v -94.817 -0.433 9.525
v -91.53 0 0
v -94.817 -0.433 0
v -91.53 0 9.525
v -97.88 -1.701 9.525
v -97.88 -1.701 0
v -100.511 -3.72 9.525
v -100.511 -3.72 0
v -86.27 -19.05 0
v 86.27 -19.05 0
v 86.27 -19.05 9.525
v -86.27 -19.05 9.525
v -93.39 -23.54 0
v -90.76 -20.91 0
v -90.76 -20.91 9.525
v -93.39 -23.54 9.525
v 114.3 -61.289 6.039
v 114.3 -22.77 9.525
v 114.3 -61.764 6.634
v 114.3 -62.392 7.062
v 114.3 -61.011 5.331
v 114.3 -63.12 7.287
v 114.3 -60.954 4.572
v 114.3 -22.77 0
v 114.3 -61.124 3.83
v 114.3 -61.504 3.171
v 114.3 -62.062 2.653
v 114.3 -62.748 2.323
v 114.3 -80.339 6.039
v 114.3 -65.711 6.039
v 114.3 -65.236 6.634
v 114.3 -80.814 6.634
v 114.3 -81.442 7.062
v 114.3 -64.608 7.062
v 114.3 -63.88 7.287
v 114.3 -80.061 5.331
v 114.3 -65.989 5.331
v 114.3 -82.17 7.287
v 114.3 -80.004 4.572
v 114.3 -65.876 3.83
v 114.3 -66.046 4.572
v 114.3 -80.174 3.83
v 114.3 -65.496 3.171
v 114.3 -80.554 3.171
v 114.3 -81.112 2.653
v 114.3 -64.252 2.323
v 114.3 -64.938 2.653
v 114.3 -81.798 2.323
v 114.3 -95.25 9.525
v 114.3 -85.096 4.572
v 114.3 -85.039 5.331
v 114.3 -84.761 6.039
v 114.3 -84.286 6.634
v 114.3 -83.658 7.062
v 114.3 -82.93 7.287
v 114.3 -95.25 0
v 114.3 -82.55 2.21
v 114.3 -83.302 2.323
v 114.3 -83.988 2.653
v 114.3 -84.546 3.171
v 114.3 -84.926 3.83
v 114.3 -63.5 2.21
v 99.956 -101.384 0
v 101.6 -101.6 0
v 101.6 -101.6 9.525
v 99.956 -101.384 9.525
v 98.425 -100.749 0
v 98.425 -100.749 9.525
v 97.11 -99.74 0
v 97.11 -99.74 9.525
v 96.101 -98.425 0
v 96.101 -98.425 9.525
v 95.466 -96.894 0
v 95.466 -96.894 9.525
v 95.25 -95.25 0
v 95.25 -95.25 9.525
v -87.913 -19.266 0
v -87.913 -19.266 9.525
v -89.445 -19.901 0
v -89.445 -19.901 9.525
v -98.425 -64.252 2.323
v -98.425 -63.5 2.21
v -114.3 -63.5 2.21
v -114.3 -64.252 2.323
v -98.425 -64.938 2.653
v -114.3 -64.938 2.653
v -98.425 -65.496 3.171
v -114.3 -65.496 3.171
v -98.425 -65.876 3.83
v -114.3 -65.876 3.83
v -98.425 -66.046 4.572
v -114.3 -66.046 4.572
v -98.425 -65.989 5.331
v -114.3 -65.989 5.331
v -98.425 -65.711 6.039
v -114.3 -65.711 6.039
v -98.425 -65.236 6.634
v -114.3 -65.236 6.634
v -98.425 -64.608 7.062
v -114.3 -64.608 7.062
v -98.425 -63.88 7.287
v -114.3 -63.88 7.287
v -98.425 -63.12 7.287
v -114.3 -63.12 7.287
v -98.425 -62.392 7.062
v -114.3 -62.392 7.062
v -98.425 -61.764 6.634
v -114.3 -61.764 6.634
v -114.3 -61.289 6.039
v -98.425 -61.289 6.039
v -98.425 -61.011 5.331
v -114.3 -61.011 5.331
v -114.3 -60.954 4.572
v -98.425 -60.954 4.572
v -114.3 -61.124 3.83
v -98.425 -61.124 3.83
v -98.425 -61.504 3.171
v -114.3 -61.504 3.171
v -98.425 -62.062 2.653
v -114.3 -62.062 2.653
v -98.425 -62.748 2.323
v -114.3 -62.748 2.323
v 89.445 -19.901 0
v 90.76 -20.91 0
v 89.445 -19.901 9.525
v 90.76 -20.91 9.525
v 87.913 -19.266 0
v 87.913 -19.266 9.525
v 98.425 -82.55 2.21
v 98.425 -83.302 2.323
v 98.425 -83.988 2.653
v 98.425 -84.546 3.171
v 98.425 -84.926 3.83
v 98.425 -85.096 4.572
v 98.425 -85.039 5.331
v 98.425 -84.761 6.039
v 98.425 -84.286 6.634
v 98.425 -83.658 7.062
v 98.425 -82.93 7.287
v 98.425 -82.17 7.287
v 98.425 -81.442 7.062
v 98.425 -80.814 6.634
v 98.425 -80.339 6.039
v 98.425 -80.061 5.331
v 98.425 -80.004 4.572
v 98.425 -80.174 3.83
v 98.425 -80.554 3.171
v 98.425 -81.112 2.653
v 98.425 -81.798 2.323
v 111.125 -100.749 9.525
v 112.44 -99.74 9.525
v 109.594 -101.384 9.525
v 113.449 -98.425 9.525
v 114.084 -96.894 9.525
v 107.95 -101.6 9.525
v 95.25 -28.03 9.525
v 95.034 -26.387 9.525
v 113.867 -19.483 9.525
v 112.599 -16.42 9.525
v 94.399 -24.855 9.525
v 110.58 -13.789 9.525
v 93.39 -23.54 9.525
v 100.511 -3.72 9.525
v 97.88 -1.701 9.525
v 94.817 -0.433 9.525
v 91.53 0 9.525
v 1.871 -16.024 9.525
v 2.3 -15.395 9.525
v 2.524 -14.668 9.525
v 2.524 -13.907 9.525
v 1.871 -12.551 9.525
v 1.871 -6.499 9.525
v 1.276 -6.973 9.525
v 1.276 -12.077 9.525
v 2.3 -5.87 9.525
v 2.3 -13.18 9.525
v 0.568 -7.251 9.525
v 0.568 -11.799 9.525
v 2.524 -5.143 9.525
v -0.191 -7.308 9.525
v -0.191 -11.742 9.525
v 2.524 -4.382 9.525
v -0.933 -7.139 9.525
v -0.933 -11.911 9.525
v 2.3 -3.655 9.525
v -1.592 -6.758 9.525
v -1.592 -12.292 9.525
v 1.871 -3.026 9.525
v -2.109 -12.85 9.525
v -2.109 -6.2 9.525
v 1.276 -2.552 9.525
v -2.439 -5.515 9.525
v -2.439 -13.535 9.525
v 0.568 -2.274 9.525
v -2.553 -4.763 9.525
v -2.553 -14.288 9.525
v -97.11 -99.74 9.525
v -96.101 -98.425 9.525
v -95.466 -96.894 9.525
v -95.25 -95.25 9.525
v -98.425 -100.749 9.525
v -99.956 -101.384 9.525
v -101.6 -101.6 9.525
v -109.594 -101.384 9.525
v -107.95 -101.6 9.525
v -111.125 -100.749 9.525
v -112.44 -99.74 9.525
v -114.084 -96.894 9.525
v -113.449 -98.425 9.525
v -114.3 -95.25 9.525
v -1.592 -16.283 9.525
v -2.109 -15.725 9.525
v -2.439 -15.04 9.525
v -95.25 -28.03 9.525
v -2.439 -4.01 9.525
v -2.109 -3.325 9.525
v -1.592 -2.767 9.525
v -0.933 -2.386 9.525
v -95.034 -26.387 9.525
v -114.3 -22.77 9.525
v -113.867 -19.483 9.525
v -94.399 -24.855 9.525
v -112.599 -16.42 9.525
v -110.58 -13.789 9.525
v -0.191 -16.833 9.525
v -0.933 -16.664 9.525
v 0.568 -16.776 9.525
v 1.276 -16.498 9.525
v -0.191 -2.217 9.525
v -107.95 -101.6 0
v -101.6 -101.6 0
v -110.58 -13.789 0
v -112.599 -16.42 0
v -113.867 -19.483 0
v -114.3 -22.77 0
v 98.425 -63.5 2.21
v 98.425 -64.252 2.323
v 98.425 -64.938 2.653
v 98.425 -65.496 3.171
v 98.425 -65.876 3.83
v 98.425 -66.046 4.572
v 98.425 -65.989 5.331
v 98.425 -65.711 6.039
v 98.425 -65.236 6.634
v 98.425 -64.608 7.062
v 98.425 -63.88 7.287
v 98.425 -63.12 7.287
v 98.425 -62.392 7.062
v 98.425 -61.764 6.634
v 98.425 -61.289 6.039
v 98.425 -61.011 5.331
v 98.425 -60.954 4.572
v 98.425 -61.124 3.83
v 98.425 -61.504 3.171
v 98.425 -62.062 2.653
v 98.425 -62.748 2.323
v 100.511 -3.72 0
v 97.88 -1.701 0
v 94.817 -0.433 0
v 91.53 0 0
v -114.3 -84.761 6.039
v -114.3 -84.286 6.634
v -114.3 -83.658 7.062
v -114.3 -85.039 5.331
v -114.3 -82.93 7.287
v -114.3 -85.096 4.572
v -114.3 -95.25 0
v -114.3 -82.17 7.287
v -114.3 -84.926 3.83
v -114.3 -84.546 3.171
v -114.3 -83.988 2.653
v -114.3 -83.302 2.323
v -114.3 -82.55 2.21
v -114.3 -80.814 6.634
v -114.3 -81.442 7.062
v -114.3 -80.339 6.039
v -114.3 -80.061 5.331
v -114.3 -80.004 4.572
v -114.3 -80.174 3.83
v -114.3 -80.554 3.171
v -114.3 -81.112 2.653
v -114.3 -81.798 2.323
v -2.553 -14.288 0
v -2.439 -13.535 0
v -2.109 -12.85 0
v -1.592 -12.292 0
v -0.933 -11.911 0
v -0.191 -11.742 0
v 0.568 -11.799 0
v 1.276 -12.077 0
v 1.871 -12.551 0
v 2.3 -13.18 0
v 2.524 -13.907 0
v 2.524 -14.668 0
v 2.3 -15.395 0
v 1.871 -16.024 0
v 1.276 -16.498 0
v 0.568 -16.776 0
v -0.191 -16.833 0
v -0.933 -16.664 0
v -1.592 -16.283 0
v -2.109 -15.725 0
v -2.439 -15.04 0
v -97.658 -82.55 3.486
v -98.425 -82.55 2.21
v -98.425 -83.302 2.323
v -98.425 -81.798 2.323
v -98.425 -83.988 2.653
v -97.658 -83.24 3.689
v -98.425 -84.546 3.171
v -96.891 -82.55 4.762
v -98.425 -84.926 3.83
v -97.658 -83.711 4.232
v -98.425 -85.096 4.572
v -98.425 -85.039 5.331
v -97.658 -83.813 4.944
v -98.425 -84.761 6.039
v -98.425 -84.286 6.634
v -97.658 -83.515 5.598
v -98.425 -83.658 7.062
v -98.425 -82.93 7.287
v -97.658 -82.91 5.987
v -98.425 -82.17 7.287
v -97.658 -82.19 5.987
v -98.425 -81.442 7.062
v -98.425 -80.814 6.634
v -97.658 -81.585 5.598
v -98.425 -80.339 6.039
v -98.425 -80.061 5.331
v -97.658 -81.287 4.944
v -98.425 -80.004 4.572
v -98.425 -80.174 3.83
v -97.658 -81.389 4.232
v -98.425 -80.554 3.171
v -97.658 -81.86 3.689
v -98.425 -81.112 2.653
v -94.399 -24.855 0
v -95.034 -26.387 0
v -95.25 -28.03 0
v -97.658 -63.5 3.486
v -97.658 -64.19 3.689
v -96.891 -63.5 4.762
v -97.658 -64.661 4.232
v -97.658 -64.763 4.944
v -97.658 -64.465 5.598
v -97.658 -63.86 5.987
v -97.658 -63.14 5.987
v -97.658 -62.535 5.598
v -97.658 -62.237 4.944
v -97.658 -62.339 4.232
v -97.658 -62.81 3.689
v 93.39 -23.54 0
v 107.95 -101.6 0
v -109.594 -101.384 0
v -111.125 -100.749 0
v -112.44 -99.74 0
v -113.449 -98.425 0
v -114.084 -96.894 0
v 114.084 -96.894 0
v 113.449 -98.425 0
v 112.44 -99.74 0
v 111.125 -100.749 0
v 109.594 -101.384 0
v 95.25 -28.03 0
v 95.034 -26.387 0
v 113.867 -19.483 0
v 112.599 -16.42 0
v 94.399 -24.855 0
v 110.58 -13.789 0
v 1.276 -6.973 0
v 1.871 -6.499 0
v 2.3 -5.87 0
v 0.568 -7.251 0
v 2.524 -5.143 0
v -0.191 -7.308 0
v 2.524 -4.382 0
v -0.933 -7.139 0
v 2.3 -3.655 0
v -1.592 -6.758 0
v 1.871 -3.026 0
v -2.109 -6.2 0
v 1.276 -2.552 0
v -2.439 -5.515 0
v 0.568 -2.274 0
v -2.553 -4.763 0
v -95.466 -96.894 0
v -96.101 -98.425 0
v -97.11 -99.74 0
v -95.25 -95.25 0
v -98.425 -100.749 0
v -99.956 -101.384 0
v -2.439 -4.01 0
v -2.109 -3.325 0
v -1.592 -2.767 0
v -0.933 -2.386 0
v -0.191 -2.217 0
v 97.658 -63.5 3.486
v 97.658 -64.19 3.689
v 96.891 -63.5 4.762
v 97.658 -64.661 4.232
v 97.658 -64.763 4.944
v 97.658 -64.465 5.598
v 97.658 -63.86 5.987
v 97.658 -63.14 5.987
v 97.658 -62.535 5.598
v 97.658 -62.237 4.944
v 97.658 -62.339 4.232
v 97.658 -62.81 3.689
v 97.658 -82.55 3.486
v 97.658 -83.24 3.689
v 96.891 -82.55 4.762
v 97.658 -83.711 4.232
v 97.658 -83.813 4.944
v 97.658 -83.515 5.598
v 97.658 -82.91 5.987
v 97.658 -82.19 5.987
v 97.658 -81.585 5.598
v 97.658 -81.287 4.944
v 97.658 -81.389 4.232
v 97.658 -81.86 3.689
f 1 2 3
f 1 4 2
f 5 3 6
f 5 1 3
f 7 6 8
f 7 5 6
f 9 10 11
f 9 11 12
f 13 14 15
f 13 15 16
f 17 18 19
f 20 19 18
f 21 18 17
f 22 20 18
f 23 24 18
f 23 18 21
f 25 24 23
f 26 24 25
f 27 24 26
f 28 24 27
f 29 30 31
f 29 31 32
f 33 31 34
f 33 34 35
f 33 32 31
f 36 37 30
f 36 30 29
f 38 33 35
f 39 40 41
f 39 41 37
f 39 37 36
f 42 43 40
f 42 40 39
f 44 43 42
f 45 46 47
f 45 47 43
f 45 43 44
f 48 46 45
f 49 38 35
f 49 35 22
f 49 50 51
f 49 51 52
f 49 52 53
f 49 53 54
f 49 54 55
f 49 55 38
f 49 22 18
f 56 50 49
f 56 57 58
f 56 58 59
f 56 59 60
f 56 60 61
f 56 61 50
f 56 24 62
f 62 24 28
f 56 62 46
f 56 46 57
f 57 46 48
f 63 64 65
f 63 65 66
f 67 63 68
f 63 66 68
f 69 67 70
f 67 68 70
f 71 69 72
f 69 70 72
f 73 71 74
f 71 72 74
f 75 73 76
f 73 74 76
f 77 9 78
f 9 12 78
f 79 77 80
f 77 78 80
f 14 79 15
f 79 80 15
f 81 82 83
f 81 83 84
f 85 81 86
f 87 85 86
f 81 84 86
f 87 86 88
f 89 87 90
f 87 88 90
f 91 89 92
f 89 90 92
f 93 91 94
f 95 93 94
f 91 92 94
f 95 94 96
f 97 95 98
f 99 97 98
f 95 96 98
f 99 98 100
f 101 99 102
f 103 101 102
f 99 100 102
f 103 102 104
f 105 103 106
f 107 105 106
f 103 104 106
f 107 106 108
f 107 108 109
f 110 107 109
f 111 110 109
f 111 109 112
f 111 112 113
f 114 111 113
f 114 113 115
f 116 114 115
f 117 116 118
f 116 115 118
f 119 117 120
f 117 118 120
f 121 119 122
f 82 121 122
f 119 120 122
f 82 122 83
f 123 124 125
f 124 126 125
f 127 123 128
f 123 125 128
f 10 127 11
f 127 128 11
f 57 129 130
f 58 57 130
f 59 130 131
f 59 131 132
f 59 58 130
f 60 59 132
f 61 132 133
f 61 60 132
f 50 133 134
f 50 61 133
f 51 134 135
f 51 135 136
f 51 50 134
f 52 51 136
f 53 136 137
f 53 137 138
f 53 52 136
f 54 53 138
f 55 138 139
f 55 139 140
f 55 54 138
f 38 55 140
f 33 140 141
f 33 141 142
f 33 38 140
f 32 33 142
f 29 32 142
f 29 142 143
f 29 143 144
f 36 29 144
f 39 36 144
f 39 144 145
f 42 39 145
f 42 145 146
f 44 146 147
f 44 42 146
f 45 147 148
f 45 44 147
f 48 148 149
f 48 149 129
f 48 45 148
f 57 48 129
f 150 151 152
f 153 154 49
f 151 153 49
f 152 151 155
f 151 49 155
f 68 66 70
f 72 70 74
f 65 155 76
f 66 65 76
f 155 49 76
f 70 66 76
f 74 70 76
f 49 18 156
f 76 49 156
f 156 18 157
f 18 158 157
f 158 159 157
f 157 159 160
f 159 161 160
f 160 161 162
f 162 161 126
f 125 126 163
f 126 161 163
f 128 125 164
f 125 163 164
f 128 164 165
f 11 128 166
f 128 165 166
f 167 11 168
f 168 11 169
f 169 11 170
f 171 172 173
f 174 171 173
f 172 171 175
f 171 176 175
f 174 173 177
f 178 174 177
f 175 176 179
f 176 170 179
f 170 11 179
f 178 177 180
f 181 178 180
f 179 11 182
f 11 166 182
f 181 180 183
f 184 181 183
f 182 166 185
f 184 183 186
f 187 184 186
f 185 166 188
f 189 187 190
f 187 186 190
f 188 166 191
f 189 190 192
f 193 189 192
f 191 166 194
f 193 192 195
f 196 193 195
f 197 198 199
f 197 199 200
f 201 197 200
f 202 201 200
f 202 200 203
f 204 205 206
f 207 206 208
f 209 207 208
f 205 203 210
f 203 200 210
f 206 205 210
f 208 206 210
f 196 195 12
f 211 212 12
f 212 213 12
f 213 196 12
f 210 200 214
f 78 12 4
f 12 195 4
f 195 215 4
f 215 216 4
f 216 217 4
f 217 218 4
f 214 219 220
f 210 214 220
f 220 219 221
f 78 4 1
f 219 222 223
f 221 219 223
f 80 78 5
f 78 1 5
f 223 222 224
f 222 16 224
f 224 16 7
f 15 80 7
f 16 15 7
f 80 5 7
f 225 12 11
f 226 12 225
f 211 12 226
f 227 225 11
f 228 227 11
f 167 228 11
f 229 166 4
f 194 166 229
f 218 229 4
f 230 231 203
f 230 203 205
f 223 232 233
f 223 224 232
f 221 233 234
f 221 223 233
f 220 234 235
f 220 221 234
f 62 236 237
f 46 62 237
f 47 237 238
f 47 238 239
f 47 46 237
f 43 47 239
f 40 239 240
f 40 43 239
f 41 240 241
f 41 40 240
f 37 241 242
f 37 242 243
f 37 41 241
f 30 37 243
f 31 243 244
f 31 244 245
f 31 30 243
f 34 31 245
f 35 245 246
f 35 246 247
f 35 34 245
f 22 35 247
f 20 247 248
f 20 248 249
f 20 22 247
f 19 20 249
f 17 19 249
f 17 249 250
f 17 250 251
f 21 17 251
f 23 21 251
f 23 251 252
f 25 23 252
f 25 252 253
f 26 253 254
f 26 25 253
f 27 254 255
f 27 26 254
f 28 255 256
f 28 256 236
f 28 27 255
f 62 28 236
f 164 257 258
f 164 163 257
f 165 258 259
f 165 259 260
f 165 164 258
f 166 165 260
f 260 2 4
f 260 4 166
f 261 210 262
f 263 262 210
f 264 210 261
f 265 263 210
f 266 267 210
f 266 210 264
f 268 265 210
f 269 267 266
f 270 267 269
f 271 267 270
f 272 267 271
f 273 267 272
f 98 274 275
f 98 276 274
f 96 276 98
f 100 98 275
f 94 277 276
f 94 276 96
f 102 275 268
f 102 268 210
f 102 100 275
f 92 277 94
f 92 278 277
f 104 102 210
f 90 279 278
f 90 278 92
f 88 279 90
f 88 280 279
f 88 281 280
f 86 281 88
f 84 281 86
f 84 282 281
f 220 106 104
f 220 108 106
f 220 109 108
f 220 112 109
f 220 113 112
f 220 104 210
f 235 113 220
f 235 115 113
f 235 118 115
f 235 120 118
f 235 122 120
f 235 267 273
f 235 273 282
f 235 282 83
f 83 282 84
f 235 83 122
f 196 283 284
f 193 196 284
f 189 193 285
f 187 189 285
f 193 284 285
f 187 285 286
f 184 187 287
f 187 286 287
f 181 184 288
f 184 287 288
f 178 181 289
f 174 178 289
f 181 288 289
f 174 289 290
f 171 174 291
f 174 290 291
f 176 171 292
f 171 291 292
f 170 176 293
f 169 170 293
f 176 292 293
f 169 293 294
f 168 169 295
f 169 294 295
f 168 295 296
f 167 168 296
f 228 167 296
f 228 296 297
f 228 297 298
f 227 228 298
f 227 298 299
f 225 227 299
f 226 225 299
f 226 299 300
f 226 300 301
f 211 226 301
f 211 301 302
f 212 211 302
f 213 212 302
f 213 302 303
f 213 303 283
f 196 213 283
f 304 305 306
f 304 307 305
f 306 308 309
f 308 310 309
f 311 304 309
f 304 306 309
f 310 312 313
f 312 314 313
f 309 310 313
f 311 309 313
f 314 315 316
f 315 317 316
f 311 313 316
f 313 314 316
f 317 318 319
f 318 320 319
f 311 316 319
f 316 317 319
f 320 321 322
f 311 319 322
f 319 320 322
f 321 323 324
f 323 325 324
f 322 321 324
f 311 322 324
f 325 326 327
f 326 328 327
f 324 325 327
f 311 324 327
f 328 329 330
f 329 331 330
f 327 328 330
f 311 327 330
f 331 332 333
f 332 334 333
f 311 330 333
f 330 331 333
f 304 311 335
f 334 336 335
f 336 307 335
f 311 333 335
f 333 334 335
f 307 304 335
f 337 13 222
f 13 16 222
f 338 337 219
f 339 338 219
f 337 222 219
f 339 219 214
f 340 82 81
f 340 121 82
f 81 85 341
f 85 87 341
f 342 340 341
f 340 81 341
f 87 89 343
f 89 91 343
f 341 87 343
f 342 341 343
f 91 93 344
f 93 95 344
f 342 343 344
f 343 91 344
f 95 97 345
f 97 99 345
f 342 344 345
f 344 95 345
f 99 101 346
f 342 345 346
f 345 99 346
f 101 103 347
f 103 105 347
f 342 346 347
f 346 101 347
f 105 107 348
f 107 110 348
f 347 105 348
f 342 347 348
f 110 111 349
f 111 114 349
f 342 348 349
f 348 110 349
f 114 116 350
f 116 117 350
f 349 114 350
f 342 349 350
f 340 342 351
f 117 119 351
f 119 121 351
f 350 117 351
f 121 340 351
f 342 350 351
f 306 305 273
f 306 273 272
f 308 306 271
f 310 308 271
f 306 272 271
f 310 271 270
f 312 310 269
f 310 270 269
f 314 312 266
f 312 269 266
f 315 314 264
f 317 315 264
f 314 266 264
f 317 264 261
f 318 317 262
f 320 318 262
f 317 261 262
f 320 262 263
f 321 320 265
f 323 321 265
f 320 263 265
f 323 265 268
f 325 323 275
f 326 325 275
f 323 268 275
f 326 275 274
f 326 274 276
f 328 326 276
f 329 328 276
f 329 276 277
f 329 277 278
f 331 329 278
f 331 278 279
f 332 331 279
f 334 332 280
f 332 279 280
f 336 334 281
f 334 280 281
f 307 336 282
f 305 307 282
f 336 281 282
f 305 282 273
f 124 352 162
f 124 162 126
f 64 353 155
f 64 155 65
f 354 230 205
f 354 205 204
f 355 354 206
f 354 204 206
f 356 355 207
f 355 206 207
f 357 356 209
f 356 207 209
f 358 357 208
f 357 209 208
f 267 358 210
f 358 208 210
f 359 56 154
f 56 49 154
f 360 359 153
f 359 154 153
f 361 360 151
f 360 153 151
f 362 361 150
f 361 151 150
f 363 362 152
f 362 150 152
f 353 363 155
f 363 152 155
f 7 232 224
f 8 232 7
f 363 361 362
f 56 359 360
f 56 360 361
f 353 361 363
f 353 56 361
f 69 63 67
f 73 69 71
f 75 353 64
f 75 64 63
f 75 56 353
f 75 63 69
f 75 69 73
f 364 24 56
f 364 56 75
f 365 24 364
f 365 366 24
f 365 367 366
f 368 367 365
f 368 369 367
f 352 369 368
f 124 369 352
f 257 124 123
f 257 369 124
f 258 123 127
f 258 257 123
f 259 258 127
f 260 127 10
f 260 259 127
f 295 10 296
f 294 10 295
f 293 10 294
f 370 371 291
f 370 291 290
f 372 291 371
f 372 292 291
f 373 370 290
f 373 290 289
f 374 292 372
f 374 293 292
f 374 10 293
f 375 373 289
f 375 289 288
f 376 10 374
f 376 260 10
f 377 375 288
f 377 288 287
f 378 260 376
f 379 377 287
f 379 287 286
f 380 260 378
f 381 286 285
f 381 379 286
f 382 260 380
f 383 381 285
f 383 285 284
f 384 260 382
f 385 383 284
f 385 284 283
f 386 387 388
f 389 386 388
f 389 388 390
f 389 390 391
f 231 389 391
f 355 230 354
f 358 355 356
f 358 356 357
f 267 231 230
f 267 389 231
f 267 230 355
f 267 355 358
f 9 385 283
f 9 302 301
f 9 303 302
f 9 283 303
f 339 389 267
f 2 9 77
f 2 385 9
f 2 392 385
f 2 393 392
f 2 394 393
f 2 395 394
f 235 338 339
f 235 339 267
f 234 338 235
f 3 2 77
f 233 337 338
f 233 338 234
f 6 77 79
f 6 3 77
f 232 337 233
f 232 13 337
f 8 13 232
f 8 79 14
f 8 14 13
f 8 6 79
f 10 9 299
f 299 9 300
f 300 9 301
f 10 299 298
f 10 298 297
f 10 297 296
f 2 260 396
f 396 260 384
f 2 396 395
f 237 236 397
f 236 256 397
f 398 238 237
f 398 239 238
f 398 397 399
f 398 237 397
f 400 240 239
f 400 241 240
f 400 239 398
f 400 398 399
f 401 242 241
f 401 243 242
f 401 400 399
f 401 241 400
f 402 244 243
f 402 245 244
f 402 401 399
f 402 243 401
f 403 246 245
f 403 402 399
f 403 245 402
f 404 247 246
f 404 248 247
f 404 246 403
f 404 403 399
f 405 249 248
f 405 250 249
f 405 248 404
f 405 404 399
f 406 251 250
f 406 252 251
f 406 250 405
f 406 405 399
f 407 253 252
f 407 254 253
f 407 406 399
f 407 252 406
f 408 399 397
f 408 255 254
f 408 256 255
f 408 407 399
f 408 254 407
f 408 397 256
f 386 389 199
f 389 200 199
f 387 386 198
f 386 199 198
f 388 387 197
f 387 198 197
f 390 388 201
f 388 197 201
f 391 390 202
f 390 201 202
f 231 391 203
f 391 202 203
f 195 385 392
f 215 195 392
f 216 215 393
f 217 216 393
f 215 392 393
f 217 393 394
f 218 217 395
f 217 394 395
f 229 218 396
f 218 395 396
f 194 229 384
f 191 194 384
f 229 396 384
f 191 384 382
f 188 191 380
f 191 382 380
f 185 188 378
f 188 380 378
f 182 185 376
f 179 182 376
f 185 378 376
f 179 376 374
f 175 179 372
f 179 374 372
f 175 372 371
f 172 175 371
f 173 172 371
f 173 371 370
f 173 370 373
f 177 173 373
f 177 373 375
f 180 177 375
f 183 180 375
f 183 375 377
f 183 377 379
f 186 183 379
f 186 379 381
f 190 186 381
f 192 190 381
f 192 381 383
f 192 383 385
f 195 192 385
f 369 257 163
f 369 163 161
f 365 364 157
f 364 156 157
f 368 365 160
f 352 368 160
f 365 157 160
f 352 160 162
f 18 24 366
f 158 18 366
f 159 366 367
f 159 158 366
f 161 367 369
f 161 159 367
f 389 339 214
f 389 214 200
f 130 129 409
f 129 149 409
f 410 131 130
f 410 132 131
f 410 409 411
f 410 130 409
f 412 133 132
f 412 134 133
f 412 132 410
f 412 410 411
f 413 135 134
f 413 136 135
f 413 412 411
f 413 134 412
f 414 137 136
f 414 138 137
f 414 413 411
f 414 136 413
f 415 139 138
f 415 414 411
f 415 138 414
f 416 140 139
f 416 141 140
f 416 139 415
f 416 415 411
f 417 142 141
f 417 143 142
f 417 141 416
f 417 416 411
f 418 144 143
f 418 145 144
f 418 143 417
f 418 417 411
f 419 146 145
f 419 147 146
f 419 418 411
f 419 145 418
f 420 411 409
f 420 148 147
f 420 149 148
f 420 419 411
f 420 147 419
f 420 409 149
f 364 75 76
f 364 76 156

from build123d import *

# Parameters (mm, degrees)
BOSS_EXTRUDE1_DEPTH              = 9.525
FILLET3_R                        = 6.35
FILLET1_R                        = 12.7
F_1_4_20_TAPPED_HOLE1_D          = 5.1054
F_1_4_20_TAPPED_HOLE2_AT_2_COUNT = 2
F_1_4_20_TAPPED_HOLE2_AT_2_PITCH = 19.05


with BuildPart() as part:
    # Sketch1 → Boss-Extrude1 (new body)
    with BuildSketch(Plane.XY):
        Polygon((-114.3, -17.509231637), (-96.790768363, 0), (96.790768363, 0), (114.3, -17.509231637), (114.3, -101.6), (95.25, -101.6), (95.25, -25.4), (88.9, -19.05), (-88.9, -19.05), (-95.25, -25.4), (-95.25, -101.6), (-114.3, -101.6), align=None)
    extrude(amount=BOSS_EXTRUDE1_DEPTH)

    # Fillet3
    fillet3_edges = [part.edges().sort_by_distance(p)[0] for p in [
        (114.3, -101.6, 4.7625),
        (95.25, -101.6, 4.7625),
        (95.25, -25.4, 4.7625),
        (88.9, -19.05, 4.7625),
        (-88.9, -19.05, 4.7625),
        (-95.25, -25.4, 4.7625),
        (-95.25, -101.6, 4.7625),
        (-114.3, -101.6, 4.7625),
    ]]
    fillet(fillet3_edges, radius=FILLET3_R)

    # Fillet1
    fillet1_edges = [part.edges().sort_by_distance(p)[0] for p in [
        (-114.3, -17.509231637, 4.7625),
        (-96.790768363, 0, 4.7625),
        (96.790768363, 0, 4.7625),
        (114.3, -17.509231637, 4.7625),
    ]]
    fillet(fillet1_edges, radius=FILLET1_R)

    # 1/4-20 Tapped Hole1 (through all)
    with Locations(Plane.XY.offset(9.525)):
        with Locations((0, -4.7625), (0, -14.2875)):
            Hole(F_1_4_20_TAPPED_HOLE1_D / 2)

    # Sketch5 → 1/4-20 Tapped Hole2 (revolve, cut)
    with BuildSketch(Plane(origin=(114.3, -82.55, 4.7625), x_dir=(0, 0, -1), z_dir=(0, 1, 0))):
        Polygon((0, 0), (0, 17.408816902), (2.5527, 15.875), (2.5527, 0), align=None)
    f_1_4_20_tapped_hole2 = revolve(axis=Axis((120.65, -82.55, 4.7625), (-1, 0, 0)), mode=Mode.SUBTRACT)

    # 1/4-20 Tapped Hole2 at 2: 1/4-20 Tapped Hole2 ×2
    with Locations(*[(0, i * F_1_4_20_TAPPED_HOLE2_AT_2_PITCH, 0) for i in range(1, F_1_4_20_TAPPED_HOLE2_AT_2_COUNT)]):
        add(f_1_4_20_tapped_hole2, mode=Mode.SUBTRACT)

    # Mirror1: 1/4-20 Tapped Hole2 across plane
    add(f_1_4_20_tapped_hole2.mirror(Plane(origin=(0, 0, 0), x_dir=(0, 0, 1), z_dir=(1, 0, 0))), mode=Mode.SUBTRACT)

    # Mirror1 copy 1 sketch → Mirror1 copy 1 (revolve, cut)
    with BuildSketch(Plane(origin=(-114.3, -63.5, 4.7625), x_dir=(0, 0, -1), z_dir=(0, 1, 0))):
        Polygon((0, 0), (0, -17.408816902), (2.5527, -15.875), (2.5527, 0), align=None)
    revolve(axis=Axis((-120.65, -63.5, 4.7625), (-1, 0, 0)), mode=Mode.SUBTRACT)


solid = part.part
